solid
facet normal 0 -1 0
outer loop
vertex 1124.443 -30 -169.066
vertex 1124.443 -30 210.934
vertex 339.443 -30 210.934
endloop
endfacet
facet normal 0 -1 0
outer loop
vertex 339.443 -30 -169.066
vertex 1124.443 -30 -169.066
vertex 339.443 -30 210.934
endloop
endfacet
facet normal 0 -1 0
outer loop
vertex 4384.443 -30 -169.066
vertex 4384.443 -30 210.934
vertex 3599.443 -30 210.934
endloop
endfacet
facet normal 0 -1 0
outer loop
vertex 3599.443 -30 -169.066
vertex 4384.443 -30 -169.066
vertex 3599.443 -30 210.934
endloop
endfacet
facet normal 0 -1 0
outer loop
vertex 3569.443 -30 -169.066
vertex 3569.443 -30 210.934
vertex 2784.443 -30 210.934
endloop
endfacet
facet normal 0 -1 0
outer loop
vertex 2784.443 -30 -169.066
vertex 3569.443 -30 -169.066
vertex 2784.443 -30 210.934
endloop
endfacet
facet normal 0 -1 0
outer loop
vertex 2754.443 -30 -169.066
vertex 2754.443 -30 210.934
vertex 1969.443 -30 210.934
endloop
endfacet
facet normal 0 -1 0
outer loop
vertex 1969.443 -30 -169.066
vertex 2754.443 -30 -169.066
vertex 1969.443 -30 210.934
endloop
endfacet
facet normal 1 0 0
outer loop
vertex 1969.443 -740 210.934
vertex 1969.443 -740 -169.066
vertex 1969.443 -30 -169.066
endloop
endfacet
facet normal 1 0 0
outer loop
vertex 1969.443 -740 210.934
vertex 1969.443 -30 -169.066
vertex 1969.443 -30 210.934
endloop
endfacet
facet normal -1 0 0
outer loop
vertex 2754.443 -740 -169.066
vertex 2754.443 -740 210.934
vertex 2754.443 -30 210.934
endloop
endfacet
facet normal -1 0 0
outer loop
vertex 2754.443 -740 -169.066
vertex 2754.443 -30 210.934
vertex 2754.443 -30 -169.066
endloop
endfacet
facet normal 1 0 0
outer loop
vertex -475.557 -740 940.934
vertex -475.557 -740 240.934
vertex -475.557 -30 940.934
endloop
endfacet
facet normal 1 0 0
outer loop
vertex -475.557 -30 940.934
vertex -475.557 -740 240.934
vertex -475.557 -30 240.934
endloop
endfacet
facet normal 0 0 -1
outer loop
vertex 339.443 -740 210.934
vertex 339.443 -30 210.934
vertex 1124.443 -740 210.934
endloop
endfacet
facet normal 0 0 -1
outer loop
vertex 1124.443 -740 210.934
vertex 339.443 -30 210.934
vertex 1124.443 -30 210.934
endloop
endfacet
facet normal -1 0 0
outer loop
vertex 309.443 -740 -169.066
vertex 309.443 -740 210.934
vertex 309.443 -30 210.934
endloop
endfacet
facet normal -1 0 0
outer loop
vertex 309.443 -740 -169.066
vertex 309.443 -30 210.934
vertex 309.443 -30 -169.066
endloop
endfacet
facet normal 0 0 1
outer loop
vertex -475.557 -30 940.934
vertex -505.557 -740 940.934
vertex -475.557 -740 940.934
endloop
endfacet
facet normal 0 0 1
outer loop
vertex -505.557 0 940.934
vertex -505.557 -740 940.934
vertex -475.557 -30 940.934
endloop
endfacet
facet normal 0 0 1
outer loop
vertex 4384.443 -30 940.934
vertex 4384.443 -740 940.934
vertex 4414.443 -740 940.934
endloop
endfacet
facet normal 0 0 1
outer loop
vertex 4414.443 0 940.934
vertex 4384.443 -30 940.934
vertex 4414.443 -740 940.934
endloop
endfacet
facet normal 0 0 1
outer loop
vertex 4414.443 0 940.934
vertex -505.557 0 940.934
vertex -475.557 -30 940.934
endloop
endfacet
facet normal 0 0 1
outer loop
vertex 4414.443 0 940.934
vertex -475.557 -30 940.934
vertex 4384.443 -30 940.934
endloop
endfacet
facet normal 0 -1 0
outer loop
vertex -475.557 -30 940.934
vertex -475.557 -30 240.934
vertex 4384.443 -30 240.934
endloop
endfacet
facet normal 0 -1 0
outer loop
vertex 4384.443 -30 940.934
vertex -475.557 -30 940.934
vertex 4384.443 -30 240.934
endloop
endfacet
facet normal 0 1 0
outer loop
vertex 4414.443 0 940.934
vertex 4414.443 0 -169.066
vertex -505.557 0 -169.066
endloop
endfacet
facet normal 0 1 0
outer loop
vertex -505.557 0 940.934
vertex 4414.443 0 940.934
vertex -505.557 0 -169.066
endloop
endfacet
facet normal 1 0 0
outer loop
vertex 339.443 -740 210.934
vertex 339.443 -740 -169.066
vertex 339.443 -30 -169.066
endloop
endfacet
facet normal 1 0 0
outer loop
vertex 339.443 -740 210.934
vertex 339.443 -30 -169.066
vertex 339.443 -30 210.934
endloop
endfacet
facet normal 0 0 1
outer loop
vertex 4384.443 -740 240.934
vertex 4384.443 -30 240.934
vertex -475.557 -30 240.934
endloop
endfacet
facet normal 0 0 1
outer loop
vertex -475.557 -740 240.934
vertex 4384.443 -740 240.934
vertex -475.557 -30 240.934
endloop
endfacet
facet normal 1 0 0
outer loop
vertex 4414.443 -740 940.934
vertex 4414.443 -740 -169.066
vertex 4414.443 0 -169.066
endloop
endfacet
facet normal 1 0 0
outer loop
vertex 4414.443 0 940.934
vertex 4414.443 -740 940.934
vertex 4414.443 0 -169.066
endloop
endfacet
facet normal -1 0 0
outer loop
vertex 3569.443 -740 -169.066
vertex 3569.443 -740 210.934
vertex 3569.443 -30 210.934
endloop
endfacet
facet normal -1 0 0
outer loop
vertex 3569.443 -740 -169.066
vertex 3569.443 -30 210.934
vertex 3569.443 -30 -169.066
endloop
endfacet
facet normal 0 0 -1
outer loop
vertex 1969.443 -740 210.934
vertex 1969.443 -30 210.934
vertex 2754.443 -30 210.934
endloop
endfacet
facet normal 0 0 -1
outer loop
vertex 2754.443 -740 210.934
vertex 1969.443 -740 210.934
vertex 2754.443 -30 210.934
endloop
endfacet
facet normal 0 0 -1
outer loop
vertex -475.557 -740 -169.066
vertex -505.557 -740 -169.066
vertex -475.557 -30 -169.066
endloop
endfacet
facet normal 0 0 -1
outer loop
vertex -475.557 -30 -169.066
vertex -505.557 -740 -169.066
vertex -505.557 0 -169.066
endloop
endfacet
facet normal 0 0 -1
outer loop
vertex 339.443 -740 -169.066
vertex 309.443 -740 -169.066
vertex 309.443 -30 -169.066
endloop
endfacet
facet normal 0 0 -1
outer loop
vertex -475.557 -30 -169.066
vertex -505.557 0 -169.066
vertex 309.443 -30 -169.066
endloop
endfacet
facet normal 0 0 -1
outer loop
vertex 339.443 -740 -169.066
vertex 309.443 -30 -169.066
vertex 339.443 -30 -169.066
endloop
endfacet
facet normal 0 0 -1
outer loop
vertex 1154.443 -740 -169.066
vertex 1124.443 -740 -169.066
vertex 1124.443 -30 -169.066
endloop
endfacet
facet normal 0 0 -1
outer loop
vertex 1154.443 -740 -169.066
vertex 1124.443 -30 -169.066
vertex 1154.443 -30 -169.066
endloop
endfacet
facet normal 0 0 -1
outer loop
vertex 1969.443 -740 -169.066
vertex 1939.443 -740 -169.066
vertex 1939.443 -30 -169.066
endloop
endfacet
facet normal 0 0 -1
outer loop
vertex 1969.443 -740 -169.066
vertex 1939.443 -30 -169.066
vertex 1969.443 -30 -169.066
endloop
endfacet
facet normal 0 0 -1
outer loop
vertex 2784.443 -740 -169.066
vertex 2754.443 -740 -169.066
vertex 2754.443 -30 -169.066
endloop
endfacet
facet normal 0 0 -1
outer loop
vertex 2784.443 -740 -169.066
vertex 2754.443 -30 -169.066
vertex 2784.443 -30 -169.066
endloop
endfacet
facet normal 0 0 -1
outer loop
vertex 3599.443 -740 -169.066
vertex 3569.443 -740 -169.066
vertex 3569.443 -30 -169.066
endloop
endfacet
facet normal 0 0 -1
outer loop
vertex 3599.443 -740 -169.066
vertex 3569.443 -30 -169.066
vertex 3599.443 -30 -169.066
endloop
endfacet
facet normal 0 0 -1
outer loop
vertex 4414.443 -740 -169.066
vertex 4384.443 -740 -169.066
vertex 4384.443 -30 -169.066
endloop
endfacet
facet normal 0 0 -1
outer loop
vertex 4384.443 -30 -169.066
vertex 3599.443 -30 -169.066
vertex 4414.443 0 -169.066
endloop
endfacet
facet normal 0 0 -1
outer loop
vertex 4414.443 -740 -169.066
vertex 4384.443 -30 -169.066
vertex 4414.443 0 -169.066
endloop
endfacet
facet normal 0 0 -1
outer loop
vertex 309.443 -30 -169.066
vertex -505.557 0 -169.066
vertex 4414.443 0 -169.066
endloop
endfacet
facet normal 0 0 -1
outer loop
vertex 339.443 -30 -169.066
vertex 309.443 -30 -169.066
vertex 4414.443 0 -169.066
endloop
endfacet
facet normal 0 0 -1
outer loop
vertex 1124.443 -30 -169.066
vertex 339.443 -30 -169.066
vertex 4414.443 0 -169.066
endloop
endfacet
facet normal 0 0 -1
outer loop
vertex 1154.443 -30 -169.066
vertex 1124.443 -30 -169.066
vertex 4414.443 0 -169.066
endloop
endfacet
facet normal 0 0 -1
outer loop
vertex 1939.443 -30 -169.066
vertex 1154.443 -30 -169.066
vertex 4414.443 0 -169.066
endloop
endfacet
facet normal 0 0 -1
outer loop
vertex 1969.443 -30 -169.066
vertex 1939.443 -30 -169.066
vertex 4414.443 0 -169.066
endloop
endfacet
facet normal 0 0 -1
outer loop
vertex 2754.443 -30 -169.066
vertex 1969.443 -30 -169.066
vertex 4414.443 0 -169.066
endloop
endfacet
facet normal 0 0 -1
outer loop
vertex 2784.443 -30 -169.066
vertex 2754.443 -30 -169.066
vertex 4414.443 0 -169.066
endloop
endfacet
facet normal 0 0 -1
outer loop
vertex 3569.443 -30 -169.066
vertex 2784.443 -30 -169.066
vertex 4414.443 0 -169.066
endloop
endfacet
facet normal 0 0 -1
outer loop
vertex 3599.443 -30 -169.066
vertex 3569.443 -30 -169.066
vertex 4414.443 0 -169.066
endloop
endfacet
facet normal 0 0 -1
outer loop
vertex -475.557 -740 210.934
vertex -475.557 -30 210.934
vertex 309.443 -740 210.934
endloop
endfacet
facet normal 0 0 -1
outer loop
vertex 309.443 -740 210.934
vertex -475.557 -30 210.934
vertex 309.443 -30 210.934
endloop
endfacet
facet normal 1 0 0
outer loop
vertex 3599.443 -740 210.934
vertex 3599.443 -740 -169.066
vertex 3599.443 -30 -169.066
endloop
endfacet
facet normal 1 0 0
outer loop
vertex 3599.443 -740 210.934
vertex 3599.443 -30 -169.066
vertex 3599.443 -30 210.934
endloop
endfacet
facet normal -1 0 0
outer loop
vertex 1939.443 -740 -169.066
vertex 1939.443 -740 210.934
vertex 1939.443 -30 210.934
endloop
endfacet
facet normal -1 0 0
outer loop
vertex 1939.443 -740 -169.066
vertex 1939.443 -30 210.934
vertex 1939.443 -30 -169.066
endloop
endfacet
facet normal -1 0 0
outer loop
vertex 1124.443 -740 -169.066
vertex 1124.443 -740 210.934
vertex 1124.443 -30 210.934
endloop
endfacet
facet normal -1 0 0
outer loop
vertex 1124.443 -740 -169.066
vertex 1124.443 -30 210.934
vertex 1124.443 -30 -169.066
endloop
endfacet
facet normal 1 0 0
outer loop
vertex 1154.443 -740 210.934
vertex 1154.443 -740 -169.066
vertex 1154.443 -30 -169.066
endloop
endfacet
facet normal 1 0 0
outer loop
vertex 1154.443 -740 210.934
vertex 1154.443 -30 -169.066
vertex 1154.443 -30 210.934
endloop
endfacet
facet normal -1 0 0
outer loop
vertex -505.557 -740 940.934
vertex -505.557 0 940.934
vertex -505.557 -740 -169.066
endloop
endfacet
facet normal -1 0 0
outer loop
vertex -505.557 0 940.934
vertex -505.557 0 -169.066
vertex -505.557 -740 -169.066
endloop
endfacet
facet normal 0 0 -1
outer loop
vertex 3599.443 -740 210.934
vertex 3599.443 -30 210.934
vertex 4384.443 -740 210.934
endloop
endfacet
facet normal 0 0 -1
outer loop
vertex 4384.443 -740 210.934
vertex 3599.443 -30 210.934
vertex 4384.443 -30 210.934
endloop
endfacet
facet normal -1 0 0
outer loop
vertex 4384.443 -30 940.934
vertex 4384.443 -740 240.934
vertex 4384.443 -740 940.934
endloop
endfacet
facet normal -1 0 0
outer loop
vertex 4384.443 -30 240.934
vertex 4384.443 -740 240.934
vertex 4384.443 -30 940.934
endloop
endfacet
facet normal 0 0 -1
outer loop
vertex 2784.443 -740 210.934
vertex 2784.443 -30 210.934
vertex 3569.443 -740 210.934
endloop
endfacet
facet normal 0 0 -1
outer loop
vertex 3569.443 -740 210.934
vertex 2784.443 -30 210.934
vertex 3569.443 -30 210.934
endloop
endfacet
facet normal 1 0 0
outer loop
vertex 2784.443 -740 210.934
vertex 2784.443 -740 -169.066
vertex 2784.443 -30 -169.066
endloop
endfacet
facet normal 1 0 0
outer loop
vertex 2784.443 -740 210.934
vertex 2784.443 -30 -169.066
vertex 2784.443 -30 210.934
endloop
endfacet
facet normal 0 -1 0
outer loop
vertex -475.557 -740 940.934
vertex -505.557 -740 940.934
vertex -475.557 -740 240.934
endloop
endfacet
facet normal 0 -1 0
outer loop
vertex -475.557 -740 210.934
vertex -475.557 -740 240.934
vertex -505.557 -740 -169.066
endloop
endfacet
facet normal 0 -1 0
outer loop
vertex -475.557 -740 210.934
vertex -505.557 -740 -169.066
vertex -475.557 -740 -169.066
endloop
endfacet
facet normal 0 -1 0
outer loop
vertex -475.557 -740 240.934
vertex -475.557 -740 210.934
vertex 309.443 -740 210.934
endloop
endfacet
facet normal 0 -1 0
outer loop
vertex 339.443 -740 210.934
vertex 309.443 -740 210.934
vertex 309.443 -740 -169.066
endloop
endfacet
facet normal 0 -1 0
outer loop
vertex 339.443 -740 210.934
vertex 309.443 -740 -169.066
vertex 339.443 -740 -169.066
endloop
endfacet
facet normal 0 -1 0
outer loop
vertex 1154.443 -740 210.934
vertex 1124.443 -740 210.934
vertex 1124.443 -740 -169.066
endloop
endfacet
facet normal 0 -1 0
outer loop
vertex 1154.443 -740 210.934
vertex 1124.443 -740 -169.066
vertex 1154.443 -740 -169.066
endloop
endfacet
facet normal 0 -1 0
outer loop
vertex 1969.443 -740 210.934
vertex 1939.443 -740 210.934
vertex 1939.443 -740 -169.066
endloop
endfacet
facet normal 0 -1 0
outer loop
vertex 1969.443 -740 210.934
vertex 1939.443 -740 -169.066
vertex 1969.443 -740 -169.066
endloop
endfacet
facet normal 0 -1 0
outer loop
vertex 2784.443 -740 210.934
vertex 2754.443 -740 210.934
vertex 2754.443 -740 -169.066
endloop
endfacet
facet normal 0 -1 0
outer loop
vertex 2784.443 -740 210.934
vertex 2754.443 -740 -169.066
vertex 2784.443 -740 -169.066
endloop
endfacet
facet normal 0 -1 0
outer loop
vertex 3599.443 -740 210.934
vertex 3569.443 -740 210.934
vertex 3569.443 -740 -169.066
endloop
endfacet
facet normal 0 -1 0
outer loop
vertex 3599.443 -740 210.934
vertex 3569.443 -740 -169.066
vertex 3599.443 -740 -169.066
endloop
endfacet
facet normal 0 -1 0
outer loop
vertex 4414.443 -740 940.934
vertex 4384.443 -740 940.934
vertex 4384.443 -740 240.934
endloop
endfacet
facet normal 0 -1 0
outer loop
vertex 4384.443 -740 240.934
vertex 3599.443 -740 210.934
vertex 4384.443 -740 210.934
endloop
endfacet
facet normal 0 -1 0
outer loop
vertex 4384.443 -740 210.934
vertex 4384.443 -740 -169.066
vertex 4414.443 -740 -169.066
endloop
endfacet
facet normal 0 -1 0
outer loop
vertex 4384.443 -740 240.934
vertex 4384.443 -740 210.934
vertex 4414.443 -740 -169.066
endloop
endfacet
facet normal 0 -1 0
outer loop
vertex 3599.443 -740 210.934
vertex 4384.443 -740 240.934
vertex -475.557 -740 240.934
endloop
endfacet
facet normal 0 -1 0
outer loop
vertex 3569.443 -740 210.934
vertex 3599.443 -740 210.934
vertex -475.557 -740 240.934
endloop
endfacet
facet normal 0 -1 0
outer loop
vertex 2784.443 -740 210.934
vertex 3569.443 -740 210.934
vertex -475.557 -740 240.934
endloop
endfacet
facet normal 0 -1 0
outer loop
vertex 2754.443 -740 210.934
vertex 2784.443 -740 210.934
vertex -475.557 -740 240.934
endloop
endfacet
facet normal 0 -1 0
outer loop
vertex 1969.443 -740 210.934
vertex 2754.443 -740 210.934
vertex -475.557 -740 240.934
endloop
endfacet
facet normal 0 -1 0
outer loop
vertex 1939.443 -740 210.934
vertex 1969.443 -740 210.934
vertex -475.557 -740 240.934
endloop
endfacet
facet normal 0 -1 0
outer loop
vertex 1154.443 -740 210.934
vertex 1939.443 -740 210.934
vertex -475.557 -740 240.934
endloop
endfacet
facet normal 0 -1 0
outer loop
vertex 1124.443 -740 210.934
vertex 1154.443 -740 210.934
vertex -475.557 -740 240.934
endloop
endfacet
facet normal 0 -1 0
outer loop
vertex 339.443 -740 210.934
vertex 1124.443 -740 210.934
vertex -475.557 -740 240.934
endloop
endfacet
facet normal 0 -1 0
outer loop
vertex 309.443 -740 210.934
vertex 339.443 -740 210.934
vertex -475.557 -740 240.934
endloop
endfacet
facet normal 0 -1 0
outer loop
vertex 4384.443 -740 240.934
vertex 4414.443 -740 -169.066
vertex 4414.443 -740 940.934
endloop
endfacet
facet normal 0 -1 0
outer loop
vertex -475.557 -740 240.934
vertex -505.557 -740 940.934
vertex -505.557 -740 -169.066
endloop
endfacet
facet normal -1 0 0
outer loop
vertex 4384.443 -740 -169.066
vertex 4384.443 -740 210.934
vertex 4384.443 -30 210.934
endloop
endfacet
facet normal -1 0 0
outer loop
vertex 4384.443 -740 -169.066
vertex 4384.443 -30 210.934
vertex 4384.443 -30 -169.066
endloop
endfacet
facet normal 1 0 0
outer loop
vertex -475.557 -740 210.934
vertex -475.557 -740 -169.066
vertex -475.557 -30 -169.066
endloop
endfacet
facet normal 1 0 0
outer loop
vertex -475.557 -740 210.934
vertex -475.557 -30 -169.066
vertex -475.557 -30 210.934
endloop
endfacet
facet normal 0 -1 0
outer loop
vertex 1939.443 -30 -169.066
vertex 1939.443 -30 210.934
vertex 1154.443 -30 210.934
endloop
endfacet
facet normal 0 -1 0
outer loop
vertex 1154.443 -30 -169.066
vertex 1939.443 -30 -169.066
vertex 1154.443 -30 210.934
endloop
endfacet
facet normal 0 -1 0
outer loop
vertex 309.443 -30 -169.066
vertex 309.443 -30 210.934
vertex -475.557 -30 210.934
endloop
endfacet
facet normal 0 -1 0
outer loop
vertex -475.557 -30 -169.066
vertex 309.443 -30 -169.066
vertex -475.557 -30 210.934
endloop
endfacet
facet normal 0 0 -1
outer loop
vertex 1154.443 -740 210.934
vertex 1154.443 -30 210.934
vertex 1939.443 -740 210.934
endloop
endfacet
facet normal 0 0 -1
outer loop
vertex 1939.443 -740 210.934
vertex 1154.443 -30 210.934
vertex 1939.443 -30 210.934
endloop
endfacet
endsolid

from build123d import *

# Parameters (mm, degrees)
F1_DEPTH = 740
F2_W     = 30
F2_H     = 30
F2_W_2   = 4860
F2_H_2   = 710
F3_DEPTH = 700
F4_W     = 1360.496822
F4_H     = 30
F4_W_2   = 3559.503178
F5_DEPTH = 380


with BuildPart() as f1:
    # F0 (on Front) → F1 (new body)
    with BuildSketch(Plane.XZ):
        Polygon((4414.443317, 240.934227), (-505.556683, 240.934227), (-505.556683, 210.934227), (-505.556683, -169.065773), (-475.556683, -169.065773), (-475.556683, 210.934227), (309.443317, 210.934227), (309.443317, -169.065773), (324.443317, -169.065773), (339.443317, -169.065773), (339.443317, 210.934227), (1124.443317, 210.934227), (1124.443317, -169.065773), (1154.443317, -169.065773), (1154.443317, 210.934227), (1939.443317, 210.934227), (1939.443317, -169.065773), (1954.443317, -169.065773), (1969.443317, -169.065773), (1969.443317, 210.934227), (2754.443317, 210.934227), (2754.443317, -169.065773), (2784.443317, -169.065773), (2784.443317, 210.934227), (3569.443317, 210.934227), (3569.443317, -169.065773), (3584.443317, -169.065773), (3599.443317, -169.065773), (3599.443317, 210.934227), (4384.443317, 210.934227), (4384.443317, -169.065773), (4414.443317, -169.065773), (4414.443317, 210.934227), align=None)
    extrude(amount=F1_DEPTH)

    # F2 (on face) → F3 (join)
    with BuildSketch(Plane.XY.offset(240.934227)):
        with Locations((-490.556683, -15)):
            Rectangle(F2_W, F2_H)
        with Locations((1954.443317, -15)):
            Rectangle(F2_W_2, F2_H)
        with Locations((-490.556683, -385)):
            Rectangle(F2_W, F2_H_2)
        with Locations((4399.443317, -15)):
            Rectangle(F2_W, F2_H)
        with Locations((4399.443317, -385)):
            Rectangle(F2_W, F2_H_2)
    extrude(amount=F3_DEPTH)

    # F4 (on face) → F5 (join, through all)
    with BuildSketch(Plane(origin=(0, 0, 210.934227), x_dir=(1, 0, 0), z_dir=(0, 0, -1))):
        with Locations((3734.194906, 15)):
            Rectangle(F4_W, F4_H)
        with Locations((1274.194906, 15)):
            Rectangle(F4_W_2, F4_H)
    extrude(amount=F5_DEPTH)


solid = f1.part
